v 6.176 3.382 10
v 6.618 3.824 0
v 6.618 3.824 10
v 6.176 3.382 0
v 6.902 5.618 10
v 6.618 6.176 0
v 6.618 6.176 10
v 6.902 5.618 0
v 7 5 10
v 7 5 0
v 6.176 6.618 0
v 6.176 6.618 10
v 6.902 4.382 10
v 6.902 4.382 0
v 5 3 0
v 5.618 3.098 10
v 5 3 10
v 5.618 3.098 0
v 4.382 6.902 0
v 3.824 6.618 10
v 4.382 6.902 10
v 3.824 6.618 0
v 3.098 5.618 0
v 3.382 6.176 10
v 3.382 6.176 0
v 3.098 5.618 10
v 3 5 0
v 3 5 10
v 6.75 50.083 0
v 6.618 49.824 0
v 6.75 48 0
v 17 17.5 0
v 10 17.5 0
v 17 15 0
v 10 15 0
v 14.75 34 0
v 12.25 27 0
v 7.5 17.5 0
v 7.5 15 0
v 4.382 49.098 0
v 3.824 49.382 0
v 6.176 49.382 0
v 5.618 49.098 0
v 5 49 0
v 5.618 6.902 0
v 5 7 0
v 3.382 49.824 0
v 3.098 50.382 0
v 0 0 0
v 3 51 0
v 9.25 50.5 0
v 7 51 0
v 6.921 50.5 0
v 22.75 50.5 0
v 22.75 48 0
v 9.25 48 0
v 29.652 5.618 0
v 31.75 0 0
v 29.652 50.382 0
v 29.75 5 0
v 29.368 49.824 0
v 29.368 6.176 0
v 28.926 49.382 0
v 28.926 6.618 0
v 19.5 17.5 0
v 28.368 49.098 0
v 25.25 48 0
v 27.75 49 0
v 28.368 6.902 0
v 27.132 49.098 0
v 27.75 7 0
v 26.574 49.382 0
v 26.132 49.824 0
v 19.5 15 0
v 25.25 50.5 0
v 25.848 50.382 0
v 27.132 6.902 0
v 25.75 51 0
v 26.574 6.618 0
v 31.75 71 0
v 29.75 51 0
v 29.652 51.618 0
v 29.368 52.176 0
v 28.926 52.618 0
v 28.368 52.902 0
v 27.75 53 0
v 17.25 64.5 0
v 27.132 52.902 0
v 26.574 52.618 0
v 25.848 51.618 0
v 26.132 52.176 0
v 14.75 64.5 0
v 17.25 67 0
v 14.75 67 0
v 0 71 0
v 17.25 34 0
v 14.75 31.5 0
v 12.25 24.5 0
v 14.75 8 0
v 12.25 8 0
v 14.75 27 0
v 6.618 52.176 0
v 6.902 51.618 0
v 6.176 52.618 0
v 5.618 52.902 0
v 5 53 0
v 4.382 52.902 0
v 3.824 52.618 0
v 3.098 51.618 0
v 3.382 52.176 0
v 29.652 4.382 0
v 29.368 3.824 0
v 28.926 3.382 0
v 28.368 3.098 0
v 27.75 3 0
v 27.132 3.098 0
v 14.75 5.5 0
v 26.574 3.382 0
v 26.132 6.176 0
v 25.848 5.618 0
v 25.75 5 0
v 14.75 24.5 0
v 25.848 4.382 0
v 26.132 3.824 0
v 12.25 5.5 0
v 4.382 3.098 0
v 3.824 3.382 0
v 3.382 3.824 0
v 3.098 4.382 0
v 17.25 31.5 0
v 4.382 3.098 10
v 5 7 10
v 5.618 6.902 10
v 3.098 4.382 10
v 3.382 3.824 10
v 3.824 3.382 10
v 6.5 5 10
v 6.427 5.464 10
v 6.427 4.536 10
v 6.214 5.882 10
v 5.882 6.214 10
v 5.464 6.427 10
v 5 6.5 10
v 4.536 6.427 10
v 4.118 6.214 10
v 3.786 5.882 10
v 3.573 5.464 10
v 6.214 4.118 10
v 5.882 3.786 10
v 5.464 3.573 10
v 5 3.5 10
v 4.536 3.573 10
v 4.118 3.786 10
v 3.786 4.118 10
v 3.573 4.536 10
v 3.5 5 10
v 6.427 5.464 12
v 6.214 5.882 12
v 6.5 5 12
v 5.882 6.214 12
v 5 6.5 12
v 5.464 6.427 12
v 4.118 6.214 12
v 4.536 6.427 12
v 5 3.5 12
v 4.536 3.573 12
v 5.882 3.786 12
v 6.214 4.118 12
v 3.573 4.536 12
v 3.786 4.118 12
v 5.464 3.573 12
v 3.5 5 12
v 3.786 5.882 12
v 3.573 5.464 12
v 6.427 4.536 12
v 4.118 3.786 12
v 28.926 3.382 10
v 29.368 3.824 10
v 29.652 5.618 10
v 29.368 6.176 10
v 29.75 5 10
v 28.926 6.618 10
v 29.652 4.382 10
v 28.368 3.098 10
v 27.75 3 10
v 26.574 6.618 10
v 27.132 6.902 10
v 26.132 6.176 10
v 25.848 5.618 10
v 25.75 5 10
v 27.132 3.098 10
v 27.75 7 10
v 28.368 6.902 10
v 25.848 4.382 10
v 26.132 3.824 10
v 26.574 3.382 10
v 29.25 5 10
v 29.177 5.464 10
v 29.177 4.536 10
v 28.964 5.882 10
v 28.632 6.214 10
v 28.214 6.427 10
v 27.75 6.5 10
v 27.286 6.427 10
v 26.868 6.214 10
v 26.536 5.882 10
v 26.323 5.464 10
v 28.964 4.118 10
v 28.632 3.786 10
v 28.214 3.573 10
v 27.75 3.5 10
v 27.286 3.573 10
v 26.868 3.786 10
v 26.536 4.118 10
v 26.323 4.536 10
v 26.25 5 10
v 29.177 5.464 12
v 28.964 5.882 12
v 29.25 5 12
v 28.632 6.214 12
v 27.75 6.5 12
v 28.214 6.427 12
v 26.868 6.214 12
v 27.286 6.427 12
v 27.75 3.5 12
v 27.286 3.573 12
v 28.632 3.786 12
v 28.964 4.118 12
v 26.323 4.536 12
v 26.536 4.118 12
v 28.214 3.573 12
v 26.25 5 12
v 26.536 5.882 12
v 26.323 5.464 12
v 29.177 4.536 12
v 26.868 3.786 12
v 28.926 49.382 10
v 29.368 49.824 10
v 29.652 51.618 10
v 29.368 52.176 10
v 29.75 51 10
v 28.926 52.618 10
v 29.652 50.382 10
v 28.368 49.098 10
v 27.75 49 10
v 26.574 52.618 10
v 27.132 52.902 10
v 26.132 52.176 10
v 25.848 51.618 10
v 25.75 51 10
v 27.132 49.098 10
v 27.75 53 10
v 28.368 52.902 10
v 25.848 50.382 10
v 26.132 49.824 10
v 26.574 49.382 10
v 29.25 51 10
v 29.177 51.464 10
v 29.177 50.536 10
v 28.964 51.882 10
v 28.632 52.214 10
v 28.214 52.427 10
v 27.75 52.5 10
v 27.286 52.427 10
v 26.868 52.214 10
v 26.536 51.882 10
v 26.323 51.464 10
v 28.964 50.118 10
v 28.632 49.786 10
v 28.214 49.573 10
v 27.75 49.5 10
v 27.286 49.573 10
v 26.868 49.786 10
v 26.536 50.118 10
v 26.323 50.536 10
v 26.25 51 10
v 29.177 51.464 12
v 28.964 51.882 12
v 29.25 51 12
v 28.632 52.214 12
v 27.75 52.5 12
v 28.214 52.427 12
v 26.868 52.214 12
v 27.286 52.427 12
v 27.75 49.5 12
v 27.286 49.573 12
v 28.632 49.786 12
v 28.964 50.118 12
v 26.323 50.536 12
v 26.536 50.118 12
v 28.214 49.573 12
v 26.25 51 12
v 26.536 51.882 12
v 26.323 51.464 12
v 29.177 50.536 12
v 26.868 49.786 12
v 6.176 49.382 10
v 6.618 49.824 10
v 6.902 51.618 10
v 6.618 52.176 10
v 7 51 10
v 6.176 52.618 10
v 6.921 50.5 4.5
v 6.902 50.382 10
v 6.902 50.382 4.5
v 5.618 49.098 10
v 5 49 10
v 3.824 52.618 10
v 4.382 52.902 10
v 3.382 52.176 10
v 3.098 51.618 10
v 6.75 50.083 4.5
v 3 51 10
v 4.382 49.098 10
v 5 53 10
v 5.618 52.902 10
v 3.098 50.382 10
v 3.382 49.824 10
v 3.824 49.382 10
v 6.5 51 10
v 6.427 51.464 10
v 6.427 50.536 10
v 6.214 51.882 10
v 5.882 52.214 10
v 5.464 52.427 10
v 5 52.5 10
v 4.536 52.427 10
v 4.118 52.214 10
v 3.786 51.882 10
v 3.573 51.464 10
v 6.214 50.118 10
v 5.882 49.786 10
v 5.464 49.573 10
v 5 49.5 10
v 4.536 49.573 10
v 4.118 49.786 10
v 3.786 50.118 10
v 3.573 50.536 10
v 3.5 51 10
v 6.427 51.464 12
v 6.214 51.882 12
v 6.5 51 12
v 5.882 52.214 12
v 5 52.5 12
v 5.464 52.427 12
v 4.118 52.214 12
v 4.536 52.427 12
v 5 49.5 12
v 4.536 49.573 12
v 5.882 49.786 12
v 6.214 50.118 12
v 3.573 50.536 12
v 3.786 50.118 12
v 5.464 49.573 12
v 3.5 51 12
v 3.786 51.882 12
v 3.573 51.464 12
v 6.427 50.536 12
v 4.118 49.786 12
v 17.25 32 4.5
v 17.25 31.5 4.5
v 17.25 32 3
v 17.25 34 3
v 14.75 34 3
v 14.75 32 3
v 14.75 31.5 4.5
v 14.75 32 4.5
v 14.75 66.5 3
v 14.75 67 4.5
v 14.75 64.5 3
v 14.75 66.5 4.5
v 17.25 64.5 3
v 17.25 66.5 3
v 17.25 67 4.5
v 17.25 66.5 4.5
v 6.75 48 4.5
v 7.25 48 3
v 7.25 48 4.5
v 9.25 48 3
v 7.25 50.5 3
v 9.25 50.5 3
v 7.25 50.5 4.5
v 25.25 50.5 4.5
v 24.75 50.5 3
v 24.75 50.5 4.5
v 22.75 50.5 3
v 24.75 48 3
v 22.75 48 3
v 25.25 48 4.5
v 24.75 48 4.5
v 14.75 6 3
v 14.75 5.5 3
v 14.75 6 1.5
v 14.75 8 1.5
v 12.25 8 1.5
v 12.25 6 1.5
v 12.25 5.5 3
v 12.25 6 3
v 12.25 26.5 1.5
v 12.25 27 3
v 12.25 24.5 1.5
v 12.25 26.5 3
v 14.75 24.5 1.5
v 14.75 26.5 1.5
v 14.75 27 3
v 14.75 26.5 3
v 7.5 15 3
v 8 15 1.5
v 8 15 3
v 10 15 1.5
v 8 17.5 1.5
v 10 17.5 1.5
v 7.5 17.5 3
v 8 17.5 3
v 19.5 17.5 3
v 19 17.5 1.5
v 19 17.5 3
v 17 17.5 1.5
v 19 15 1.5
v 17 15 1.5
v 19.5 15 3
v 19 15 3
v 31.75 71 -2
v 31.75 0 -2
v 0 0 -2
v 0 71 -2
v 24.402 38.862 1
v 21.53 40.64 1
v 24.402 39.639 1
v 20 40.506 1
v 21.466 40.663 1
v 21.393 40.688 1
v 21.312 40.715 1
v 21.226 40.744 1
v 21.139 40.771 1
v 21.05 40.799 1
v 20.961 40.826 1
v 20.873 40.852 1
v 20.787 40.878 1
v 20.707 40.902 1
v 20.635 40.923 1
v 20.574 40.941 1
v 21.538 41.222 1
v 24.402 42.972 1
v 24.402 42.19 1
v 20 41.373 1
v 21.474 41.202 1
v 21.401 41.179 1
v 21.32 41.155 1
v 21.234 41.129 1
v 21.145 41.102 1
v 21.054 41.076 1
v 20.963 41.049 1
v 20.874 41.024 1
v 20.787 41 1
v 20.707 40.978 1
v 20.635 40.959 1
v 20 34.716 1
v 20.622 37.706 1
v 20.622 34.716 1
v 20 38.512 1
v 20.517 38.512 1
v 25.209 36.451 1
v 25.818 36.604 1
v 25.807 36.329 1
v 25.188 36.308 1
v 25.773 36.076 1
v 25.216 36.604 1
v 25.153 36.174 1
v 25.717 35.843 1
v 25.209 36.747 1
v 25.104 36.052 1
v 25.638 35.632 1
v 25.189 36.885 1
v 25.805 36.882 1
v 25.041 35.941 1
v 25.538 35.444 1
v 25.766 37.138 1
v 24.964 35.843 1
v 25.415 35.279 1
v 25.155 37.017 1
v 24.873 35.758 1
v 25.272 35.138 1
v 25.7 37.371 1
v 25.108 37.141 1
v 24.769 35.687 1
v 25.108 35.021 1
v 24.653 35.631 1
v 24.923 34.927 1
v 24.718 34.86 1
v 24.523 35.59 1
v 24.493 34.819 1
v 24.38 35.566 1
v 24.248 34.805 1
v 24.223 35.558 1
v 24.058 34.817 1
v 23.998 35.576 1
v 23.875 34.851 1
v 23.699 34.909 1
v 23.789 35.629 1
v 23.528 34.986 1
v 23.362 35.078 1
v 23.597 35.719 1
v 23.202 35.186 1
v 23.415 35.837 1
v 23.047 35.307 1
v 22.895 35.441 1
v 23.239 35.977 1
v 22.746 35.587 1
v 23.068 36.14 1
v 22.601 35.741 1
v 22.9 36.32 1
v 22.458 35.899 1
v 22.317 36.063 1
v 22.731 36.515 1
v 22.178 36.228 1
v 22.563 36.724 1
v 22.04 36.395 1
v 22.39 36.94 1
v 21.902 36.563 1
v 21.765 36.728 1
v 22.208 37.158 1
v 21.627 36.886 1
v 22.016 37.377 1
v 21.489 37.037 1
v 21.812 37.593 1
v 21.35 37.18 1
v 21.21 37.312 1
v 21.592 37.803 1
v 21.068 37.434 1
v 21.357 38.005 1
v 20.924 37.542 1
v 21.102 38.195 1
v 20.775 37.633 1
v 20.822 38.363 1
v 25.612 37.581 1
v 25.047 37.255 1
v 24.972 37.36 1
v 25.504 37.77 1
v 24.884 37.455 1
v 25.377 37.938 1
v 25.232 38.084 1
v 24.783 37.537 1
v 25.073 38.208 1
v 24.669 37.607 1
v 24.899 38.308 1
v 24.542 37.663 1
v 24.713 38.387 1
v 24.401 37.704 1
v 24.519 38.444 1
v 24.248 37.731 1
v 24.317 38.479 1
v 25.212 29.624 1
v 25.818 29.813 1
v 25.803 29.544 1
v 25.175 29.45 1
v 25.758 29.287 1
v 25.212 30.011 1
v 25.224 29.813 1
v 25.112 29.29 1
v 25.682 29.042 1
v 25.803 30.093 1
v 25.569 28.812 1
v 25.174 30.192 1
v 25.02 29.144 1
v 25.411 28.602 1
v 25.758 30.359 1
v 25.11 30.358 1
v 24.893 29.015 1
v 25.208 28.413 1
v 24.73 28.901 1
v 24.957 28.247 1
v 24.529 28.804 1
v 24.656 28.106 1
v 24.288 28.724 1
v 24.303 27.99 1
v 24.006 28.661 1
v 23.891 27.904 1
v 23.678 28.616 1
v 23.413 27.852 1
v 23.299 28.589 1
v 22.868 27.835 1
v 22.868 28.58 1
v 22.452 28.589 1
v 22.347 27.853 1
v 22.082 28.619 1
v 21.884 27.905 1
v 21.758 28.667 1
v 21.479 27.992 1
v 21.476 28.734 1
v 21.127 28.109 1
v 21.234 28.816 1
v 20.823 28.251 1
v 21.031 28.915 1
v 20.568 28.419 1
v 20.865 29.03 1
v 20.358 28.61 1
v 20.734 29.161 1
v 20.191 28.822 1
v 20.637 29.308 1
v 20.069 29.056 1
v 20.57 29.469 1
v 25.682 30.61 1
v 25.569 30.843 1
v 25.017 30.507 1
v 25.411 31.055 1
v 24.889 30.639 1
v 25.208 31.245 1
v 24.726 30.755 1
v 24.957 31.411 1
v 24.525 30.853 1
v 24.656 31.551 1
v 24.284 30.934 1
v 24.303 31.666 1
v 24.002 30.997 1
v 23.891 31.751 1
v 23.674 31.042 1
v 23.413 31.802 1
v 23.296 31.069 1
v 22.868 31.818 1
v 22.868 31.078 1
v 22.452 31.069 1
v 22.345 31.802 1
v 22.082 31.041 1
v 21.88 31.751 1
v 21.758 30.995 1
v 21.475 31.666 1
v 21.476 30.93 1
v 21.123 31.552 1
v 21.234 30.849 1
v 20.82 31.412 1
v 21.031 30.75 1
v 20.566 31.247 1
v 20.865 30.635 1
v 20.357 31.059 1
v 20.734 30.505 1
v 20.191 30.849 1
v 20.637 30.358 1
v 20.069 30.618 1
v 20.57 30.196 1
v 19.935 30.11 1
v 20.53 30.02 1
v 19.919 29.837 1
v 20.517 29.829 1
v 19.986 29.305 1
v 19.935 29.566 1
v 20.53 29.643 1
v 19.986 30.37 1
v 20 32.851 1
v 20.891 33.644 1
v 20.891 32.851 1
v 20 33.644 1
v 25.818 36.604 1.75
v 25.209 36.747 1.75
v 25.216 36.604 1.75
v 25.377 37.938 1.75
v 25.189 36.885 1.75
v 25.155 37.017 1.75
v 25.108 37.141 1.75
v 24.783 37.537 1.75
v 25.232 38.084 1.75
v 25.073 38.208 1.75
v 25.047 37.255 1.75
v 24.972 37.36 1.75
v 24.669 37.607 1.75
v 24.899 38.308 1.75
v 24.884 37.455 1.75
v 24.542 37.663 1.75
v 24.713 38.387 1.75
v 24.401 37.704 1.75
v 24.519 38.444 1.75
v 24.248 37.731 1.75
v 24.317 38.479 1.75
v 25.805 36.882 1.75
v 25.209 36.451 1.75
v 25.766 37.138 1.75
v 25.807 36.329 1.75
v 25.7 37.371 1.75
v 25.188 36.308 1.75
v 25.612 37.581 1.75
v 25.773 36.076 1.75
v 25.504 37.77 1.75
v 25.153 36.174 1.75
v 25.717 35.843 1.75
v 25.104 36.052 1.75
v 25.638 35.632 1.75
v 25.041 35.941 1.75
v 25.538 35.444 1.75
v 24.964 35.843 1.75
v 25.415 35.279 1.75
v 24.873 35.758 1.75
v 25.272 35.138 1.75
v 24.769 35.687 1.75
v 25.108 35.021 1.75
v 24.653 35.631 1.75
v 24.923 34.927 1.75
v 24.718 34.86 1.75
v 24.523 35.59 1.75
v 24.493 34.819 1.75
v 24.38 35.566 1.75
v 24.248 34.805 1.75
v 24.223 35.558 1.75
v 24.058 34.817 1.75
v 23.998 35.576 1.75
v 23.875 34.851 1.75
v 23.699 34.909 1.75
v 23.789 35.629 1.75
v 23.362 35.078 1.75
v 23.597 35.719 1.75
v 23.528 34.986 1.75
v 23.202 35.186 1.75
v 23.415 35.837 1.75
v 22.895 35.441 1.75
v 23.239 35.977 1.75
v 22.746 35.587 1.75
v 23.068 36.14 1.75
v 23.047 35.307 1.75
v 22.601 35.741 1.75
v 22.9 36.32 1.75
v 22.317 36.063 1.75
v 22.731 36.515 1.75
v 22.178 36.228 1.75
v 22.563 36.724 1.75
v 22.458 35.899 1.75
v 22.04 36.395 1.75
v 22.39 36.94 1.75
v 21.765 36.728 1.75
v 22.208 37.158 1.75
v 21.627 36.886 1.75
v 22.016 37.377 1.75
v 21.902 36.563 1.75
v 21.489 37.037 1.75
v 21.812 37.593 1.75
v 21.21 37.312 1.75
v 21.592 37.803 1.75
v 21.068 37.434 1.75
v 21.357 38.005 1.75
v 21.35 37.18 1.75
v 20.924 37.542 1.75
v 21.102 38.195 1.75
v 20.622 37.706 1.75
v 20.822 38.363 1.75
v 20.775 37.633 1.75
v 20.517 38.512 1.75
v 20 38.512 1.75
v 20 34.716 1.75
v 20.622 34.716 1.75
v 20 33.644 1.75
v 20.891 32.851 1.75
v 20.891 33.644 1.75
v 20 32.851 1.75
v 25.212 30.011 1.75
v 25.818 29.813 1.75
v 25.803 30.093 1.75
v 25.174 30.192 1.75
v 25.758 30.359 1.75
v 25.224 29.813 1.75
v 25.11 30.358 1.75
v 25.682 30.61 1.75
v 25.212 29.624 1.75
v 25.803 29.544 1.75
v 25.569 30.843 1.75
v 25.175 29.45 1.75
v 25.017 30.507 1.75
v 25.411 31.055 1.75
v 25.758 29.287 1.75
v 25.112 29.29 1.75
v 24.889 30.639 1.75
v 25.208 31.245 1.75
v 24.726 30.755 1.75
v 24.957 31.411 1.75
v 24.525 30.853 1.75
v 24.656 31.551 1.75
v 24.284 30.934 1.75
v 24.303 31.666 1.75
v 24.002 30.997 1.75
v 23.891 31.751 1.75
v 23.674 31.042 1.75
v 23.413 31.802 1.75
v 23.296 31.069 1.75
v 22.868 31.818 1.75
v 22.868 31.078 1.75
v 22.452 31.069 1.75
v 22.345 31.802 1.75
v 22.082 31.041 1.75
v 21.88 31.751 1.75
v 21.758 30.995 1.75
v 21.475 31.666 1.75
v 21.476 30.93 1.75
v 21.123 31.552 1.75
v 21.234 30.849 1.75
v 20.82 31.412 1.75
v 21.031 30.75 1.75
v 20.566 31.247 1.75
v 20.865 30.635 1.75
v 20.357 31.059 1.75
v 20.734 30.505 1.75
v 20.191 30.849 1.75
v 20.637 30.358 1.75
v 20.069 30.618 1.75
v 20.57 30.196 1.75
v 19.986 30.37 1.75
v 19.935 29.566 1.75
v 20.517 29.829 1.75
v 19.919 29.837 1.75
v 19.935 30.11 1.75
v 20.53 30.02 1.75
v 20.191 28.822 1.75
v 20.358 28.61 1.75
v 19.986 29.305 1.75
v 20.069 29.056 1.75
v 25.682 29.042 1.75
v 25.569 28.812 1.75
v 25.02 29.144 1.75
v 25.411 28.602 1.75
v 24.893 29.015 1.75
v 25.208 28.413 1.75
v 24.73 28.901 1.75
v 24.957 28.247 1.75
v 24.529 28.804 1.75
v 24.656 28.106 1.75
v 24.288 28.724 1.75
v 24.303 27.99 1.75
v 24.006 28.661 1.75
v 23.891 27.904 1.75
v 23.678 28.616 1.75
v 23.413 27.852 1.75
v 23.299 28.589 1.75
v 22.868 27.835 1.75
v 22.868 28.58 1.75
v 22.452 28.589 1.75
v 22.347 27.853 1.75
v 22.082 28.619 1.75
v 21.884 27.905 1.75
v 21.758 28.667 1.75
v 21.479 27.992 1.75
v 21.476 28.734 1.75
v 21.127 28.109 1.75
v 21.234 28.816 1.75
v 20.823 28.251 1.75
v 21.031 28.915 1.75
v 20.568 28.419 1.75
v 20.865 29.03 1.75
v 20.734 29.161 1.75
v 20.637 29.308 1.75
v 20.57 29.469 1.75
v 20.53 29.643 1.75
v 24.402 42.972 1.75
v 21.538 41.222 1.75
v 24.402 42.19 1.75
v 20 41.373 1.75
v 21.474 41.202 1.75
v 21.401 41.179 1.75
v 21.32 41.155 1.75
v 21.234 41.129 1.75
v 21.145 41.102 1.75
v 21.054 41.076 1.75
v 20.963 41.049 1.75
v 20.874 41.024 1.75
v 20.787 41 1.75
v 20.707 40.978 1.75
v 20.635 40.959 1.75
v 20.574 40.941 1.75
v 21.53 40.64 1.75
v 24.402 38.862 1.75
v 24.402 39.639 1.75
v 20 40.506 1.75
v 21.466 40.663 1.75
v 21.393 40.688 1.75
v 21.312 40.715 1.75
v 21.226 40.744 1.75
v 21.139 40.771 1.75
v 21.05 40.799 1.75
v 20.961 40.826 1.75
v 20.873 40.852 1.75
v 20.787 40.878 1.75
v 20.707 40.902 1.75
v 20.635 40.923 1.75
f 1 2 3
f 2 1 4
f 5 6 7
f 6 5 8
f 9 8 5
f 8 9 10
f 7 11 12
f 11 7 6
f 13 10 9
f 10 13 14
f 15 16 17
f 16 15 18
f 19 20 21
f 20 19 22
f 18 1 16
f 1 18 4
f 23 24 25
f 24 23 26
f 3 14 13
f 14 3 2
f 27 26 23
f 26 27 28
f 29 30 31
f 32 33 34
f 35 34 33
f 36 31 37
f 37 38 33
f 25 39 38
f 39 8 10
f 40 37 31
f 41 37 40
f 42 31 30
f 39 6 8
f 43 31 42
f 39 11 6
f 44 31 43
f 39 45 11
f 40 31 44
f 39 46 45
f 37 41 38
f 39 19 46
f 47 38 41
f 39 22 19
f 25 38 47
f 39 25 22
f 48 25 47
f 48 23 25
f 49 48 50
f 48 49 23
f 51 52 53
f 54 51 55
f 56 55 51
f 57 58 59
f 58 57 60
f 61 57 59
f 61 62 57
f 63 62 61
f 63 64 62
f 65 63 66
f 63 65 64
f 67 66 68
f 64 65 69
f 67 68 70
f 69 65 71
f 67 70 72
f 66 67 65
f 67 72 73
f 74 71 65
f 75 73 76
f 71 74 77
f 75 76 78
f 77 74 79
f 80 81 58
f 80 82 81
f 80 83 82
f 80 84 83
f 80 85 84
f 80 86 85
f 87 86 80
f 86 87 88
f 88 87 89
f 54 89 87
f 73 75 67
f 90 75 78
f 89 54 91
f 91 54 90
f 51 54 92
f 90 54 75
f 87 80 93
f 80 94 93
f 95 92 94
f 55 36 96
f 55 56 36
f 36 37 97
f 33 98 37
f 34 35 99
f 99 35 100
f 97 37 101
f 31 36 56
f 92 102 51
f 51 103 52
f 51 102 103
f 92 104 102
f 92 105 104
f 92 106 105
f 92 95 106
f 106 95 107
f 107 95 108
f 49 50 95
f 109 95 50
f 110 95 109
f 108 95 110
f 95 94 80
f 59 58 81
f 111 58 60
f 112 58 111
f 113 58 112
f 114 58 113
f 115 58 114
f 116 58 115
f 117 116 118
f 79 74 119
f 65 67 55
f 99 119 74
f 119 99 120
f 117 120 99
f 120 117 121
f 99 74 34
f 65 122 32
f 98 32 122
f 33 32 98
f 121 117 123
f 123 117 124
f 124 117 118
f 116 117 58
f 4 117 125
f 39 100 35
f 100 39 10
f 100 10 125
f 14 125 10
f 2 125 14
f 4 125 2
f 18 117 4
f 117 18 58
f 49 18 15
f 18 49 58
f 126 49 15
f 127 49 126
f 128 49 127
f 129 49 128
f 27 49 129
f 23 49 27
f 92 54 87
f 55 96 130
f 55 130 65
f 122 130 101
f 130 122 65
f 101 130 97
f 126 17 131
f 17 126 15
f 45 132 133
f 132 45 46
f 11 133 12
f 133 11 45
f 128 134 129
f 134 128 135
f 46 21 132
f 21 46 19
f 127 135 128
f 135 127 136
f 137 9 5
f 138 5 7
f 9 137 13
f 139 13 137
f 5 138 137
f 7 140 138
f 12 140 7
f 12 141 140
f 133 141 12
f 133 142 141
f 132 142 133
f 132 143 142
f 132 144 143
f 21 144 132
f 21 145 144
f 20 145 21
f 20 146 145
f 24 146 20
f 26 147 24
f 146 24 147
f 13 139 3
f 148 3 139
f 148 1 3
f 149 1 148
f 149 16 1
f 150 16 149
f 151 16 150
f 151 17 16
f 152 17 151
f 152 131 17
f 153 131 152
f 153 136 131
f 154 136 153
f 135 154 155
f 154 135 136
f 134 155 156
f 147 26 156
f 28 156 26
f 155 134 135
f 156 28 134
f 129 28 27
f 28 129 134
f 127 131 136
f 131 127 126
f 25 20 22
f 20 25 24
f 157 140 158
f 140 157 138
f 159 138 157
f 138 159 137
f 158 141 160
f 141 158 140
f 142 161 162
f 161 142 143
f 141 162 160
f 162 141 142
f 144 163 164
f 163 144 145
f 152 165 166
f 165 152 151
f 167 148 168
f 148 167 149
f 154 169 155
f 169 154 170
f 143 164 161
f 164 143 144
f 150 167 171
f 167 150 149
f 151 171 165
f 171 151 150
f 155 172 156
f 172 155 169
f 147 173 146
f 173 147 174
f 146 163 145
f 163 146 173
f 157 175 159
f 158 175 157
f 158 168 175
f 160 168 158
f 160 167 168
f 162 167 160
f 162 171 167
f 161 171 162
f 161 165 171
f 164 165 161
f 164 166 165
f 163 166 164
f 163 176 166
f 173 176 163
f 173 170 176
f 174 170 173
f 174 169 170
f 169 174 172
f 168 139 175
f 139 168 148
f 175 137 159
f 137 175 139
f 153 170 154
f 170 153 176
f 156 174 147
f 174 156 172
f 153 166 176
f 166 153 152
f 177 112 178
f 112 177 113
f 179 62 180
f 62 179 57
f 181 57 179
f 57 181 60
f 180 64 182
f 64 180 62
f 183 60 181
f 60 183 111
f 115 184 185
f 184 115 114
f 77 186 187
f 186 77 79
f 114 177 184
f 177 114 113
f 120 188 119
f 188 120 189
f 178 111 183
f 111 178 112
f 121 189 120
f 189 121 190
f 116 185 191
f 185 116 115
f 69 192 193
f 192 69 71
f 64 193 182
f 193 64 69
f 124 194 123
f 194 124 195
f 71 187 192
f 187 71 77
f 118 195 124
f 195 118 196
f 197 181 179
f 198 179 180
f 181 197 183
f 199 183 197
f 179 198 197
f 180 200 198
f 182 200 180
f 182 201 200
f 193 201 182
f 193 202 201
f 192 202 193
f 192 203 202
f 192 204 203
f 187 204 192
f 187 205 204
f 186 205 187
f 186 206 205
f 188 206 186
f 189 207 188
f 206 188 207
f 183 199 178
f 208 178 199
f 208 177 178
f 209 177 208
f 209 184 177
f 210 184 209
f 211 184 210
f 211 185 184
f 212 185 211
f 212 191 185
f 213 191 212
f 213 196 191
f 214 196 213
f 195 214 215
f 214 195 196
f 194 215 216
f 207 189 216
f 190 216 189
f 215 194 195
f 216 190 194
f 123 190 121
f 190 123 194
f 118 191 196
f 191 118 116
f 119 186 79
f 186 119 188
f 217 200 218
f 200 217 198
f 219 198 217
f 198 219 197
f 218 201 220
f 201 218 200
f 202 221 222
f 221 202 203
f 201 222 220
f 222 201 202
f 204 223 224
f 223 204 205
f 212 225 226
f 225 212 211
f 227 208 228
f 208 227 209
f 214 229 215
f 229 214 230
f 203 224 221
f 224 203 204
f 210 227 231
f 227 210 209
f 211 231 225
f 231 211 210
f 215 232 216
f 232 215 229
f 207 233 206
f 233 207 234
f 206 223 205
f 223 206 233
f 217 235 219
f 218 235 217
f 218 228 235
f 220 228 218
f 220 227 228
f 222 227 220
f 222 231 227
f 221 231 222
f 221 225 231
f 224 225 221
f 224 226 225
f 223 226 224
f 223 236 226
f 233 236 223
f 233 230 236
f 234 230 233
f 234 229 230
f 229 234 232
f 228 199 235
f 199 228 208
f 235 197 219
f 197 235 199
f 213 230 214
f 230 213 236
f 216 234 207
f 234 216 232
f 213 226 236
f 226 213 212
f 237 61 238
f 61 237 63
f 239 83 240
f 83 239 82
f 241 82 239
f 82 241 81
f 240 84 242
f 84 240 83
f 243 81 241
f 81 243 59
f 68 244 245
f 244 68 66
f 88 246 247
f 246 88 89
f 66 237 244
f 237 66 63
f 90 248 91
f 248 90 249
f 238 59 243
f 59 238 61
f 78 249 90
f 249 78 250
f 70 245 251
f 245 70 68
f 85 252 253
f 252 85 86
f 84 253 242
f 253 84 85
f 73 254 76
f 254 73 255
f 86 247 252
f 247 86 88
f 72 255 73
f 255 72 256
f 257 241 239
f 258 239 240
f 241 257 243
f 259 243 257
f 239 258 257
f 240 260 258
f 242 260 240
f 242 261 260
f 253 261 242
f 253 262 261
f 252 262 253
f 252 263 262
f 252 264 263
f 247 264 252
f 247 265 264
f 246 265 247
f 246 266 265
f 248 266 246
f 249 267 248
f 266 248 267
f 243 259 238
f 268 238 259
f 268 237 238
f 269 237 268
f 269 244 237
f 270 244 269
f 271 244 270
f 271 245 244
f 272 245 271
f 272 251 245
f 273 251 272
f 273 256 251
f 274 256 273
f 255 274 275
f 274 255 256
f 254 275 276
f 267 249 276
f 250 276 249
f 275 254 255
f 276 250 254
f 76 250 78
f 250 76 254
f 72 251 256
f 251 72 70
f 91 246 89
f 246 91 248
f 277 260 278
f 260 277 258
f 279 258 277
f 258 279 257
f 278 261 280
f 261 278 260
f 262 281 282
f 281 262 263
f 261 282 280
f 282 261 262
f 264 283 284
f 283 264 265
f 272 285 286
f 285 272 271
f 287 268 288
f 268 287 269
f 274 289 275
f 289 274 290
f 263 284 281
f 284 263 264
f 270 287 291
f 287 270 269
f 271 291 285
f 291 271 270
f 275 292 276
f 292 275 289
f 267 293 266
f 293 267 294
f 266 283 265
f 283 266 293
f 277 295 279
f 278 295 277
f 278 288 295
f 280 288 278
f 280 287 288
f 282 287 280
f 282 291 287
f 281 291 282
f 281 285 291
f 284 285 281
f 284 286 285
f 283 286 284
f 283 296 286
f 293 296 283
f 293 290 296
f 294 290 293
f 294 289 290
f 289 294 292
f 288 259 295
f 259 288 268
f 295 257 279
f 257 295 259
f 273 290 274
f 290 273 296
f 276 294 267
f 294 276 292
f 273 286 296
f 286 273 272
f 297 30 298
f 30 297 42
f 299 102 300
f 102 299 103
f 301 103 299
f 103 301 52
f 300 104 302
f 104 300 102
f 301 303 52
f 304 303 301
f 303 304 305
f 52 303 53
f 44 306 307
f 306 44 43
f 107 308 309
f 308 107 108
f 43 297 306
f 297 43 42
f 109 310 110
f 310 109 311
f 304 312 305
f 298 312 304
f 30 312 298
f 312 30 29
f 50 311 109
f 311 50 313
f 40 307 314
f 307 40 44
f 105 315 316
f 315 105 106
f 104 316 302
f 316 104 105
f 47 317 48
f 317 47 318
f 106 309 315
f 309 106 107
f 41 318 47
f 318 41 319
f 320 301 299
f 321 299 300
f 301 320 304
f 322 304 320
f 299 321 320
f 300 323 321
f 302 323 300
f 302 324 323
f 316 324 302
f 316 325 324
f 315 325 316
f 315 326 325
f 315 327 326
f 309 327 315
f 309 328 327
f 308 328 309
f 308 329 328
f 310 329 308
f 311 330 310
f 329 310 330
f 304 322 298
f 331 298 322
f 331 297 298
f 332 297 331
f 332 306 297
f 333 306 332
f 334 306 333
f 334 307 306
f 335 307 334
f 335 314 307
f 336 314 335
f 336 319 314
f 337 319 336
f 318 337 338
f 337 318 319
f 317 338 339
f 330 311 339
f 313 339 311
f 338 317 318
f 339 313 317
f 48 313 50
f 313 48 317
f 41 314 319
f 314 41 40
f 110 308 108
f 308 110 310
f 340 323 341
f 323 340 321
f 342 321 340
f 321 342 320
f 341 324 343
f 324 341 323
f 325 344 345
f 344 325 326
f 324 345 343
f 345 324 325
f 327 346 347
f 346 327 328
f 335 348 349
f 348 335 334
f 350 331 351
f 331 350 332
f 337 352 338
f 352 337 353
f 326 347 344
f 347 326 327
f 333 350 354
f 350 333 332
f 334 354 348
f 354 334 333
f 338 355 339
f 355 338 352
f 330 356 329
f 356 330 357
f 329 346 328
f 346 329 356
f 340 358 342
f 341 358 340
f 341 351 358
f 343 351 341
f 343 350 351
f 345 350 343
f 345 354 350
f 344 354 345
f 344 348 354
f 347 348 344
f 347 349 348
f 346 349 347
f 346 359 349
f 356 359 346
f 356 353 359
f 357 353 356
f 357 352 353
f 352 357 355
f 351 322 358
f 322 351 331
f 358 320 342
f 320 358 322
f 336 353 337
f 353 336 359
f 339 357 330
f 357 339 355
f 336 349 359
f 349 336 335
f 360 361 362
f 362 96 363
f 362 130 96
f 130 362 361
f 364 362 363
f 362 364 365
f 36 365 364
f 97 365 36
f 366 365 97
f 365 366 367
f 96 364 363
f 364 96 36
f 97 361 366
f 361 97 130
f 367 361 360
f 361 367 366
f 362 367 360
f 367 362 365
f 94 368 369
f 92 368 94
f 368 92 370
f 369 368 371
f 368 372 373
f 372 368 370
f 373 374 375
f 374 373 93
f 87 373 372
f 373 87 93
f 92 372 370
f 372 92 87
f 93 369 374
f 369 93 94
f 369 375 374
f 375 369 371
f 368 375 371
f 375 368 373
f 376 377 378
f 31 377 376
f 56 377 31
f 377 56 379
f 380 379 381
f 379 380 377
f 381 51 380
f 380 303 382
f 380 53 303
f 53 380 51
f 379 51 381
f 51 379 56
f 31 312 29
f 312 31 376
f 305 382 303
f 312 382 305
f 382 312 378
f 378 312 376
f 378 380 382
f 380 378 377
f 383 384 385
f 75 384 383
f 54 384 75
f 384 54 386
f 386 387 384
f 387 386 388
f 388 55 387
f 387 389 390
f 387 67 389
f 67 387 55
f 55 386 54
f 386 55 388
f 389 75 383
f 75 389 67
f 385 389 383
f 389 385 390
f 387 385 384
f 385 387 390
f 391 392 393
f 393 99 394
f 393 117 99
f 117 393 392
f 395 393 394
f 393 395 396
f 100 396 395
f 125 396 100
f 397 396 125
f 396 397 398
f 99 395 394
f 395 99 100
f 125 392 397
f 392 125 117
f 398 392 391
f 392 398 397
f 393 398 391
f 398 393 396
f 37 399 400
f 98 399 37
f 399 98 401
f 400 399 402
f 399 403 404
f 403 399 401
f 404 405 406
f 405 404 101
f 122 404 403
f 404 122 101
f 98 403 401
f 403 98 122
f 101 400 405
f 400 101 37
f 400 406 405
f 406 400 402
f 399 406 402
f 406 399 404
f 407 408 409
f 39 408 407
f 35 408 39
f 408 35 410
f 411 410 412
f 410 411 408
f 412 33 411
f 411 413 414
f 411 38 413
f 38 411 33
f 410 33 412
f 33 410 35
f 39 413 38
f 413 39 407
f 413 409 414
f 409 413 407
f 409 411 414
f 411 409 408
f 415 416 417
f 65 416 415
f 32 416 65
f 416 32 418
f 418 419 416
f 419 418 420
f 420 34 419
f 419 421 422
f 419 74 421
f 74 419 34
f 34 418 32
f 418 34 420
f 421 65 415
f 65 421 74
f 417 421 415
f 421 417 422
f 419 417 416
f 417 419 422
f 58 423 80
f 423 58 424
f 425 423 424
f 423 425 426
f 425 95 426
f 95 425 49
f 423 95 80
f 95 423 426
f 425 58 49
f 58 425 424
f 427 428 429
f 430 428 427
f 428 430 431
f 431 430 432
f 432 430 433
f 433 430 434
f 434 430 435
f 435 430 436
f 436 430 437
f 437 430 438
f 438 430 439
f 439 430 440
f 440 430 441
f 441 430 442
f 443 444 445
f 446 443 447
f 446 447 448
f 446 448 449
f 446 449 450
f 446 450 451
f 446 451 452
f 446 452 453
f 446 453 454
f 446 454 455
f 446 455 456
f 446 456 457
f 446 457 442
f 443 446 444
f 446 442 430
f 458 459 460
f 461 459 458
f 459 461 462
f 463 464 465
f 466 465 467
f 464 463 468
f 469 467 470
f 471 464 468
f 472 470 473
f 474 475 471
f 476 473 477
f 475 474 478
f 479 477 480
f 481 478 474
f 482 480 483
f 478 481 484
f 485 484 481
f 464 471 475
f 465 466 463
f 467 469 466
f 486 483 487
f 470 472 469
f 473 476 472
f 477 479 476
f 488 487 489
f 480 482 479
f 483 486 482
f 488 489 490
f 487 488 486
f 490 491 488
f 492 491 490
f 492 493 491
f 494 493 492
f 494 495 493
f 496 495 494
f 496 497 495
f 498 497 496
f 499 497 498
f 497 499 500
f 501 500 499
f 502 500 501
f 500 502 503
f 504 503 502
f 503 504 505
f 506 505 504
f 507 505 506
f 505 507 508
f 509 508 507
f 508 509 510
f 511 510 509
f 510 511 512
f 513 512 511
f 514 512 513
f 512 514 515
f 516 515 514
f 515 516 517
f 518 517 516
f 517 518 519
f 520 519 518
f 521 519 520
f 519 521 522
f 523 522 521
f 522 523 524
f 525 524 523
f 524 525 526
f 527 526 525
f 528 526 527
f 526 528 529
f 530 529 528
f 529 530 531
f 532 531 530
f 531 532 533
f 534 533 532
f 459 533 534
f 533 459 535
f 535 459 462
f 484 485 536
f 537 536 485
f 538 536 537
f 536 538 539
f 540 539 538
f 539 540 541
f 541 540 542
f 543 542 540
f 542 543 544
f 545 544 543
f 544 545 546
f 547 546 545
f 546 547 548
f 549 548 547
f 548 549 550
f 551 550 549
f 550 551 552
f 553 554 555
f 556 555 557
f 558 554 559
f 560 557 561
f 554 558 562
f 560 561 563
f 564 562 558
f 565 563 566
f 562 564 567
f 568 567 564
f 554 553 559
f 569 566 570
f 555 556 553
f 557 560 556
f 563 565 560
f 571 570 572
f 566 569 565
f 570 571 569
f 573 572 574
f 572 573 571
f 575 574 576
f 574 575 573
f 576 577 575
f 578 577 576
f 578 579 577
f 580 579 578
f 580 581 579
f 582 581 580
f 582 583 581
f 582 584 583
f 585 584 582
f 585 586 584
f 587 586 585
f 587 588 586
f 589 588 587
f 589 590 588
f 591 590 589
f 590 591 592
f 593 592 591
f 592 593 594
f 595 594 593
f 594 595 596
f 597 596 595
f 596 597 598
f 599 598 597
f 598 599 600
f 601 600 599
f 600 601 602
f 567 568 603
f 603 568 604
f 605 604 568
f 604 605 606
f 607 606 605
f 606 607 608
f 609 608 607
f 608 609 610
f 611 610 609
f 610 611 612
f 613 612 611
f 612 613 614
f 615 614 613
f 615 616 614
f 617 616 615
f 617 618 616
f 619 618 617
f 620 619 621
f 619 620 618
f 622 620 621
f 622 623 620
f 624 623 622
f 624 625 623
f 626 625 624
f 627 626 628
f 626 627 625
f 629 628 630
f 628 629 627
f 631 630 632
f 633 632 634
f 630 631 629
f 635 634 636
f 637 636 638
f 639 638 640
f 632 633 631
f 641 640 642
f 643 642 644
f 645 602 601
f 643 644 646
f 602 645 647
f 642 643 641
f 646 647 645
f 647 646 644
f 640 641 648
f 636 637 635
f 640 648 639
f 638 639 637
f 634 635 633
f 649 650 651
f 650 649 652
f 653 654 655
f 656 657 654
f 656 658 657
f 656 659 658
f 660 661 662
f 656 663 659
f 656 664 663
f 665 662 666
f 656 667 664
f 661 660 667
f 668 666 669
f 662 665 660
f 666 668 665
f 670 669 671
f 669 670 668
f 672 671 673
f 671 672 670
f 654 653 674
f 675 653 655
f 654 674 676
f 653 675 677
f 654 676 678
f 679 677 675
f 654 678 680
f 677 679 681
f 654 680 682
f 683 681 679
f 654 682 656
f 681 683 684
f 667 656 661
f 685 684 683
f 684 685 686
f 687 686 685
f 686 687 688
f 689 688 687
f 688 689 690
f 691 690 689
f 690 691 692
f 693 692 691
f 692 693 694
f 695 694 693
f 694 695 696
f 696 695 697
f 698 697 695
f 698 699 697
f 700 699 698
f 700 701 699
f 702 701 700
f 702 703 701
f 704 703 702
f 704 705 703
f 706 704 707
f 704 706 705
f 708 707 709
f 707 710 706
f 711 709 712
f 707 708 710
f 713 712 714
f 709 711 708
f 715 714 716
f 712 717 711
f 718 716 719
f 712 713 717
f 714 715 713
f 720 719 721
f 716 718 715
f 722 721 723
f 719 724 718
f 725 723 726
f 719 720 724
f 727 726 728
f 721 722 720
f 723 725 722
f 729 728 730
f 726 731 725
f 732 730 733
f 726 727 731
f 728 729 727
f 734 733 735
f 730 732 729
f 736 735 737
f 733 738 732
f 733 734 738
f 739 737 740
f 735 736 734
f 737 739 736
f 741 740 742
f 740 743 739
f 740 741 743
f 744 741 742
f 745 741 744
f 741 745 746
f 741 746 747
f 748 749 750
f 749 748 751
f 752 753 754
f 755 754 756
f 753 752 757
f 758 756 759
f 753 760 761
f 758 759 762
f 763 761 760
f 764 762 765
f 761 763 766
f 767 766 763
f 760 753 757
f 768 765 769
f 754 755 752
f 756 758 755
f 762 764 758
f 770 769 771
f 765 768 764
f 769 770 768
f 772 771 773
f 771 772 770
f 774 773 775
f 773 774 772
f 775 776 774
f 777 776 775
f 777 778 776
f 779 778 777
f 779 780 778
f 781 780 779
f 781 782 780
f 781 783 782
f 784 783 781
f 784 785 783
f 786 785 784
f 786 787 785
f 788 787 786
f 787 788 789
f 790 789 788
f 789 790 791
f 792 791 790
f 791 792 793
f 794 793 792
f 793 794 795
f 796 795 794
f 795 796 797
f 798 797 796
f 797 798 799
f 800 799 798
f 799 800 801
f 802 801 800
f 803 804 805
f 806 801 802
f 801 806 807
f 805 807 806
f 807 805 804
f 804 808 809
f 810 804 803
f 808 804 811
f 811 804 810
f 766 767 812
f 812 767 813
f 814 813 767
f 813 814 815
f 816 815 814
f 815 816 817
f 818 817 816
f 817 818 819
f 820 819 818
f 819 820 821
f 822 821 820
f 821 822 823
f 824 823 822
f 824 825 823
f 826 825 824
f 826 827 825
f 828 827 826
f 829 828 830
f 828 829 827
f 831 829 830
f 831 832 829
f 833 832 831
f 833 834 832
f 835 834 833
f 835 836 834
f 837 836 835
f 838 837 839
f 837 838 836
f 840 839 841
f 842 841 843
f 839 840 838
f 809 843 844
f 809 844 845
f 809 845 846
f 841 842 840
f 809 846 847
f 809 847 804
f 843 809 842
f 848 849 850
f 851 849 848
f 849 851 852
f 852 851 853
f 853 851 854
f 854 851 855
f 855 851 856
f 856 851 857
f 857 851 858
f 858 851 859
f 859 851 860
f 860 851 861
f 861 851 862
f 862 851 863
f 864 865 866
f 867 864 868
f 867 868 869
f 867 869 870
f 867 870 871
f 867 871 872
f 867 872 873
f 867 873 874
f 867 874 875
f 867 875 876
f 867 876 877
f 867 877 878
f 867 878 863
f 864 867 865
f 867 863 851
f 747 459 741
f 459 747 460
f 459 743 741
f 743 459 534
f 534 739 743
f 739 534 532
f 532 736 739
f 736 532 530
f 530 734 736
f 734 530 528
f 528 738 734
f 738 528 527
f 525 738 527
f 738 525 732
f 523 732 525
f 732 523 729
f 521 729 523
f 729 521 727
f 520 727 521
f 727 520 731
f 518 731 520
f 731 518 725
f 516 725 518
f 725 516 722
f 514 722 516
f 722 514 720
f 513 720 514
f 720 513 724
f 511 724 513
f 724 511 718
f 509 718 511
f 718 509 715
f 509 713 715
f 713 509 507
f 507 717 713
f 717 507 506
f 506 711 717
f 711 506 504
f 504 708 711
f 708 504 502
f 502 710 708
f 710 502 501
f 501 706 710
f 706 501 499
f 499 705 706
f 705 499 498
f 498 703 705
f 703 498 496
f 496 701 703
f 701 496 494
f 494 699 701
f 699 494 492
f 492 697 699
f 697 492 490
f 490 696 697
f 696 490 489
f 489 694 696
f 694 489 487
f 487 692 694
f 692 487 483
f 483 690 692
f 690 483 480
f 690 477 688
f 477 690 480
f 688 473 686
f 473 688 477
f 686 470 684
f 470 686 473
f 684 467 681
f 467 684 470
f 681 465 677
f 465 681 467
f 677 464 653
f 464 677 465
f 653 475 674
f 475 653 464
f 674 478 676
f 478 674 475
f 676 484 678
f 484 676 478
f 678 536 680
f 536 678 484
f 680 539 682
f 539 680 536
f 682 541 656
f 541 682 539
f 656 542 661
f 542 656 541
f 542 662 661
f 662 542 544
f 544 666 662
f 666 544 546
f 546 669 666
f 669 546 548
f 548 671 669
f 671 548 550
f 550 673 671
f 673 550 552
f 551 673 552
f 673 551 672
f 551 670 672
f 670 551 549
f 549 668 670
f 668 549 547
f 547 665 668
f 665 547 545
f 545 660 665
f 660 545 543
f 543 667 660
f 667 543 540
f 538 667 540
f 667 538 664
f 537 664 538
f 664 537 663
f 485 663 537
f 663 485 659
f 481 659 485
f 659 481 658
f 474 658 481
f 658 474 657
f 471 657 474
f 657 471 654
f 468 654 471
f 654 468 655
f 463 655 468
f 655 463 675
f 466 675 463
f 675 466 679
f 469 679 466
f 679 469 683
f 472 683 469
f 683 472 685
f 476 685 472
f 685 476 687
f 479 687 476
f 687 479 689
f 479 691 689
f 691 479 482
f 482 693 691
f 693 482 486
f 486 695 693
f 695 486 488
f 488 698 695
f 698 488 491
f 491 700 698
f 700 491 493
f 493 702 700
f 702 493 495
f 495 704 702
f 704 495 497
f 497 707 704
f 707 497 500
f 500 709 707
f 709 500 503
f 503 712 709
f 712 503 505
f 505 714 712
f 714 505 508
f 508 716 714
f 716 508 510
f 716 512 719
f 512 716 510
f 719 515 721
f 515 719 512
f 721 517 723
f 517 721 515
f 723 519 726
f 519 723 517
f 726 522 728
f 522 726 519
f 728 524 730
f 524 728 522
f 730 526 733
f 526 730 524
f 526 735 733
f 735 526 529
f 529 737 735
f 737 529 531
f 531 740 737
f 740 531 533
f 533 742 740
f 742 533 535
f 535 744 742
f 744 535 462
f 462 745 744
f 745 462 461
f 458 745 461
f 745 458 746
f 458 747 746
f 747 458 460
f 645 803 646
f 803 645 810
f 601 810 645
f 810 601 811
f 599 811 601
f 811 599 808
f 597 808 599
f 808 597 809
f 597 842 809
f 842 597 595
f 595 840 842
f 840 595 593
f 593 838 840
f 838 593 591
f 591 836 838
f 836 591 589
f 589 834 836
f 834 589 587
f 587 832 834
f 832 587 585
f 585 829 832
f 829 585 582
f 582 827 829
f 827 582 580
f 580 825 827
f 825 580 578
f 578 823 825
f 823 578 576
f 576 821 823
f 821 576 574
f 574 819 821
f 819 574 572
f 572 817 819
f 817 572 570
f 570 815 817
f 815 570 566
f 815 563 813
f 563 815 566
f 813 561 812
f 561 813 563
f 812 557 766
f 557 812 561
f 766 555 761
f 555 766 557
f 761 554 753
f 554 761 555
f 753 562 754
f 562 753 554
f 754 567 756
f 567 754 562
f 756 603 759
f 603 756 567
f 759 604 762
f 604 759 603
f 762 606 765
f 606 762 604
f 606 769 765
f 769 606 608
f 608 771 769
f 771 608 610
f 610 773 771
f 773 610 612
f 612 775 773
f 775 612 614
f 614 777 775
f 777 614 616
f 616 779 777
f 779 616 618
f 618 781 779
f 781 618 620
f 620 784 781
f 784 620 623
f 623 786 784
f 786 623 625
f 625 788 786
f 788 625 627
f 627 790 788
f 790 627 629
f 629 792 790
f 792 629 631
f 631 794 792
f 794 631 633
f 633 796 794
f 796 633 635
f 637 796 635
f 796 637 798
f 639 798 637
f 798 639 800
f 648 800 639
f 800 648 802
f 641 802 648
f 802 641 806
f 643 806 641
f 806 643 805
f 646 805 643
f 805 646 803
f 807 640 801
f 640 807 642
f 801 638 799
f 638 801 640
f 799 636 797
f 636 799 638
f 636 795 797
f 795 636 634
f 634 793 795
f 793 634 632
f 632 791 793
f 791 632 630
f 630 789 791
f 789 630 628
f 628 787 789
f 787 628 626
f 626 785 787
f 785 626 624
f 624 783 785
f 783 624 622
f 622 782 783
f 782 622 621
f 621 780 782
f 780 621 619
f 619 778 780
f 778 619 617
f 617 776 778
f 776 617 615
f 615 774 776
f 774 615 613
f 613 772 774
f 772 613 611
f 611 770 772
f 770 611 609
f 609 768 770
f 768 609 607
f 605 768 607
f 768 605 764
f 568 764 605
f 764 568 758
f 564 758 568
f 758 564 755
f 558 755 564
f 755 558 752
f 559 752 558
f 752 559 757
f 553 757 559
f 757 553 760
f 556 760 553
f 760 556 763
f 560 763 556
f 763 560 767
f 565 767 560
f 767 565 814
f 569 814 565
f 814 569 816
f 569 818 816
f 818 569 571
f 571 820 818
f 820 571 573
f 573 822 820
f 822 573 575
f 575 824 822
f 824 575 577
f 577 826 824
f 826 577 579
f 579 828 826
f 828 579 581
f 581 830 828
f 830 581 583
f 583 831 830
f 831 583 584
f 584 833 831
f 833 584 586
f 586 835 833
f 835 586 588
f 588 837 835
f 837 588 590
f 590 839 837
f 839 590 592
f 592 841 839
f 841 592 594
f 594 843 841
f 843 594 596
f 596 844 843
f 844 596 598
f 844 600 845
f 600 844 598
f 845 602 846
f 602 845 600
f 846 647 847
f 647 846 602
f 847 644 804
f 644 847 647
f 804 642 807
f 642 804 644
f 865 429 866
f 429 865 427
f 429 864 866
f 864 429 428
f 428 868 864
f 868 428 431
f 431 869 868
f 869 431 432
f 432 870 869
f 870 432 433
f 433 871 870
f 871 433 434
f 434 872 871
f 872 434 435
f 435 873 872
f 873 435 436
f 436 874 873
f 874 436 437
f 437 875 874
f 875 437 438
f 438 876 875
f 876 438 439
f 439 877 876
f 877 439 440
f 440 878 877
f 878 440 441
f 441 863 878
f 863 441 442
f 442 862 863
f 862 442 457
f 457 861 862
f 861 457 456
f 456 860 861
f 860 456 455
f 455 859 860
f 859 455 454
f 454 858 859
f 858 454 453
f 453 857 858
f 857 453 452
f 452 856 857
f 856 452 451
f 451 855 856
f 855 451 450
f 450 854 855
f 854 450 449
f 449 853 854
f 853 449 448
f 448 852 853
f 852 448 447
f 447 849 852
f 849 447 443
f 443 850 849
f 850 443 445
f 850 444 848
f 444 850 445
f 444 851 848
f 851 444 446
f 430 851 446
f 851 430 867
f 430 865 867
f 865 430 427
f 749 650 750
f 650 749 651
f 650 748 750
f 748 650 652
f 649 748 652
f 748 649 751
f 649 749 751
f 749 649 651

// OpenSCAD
// file: pcb_standoff.scad
// A standoff with a setback for holding the edge of a pcb
module pcb_standoff(h=10, w=5, l=5, lip=1.5, setback=2) {
    translate([-l/2, -w+setback, 0]) {
        cube([l, w, h]);
        cube([l, w-setback, h+lip]);
    }
}

// A peg for holding the screw-hole of a pcb
module pcb_peg(h=10, outer_r=2.5, inner_r=1, lip=1.5) {
    cylinder(h=h, r=outer_r, $fn=20);
    cylinder(h=h+lip, r=inner_r, $fn=20);
}

// Support a PCB with four standoffs
module pcb_holder(pcb_w, pcb_l, standoff_w=2.5, standoff_l=2.5, h=5, lip=1.5, setback=2) {
    // width is x, length is y
    translate([pcb_w / 2, 0, 0])
        pcb_standoff(h=h, w=standoff_w, l=standoff_l, lip=lip, setback=setback);
    translate([pcb_w / 2, pcb_l, 0])
        rotate([0,0,180])
            pcb_standoff(h=h, w=standoff_w, l=standoff_l, lip=lip, setback=setback);
    translate([0, pcb_l / 2, 0])
        rotate([0,0,270])
            pcb_standoff(h=h, w=standoff_w, l=standoff_l, lip=lip, setback=setback);
    translate([pcb_w, pcb_l / 2, 0])
        rotate([0,0,90])
            pcb_standoff(h=h, w=standoff_w, l=standoff_l, lip=lip, setback=setback);
}

*pcb_standoff();
*pcb_peg();
*pcb_holder(30, 15);
// main file
include <pcb_standoff.scad>

x=0; y=1; z=2;

placeholders = false;

label_text = "v2.0";
label_size = 6;

sw = 2.5; // standoff width
hsw = sw / 2;

esp_h = 10;
esp_l=52;
esp_w=28.75;
esp_clearance_r = 2;
esp_screw_r = 1.5;
esp_peg_locs = 
[
    [2, 2],
    [esp_w - 4, 2],
    [esp_w - 4, esp_l - 4],
    [2, esp_l - 4]
];

mosfet_h = 3;
mosfet_l = 34.5;
mosfet_w = 17.5;

buck_h=1.5;
buck_l=20.5;
buck_w=11;

// pcb's
translate([3, 3, 0])
    esp32();
translate([7.25, 32, 0])
    mosfet();
translate([8, 6, 0])
    buck();
    
// base
basedim=[esp_w + 3, 71, 2];
translate([0,0,-2])
    cube(basedim);
    
// lid
translate([40, 0, 0])
    *lid();

// label
color("red") label();

module label() {
    translate([20,43,1])
    rotate([0,0,-90])
        linear_extrude(0.75)
            text(label_text, size=label_size);
}

module lid() {
    cube(basedim);
}

module esp32() {
    for (i = [0:len(esp_peg_locs)-1]) {
        translate(esp_peg_locs[i]) {
            pcb_peg(h=esp_h, outer_r=esp_clearance_r, inner_r=esp_screw_r, lip=2);
        }
    }
    if (placeholders)
        translate([0,0,esp_h])
            color("green") cube([esp_w, esp_l, 1.5]);
}

module mosfet() {
    pcb_holder(mosfet_w, mosfet_l, h=mosfet_h);
    if (placeholders) {
        translate([0,0,mosfet_h])
            color("green") cube([mosfet_w, mosfet_l, 1.5]);
        translate([0,mosfet_l-10,mosfet_h+1.5])
            color("blue") cube([mosfet_w, 10, 10]);
    }
}

module buck() {
    pcb_holder(buck_w, buck_l, h=buck_h);
    if (placeholders)
        translate([0,0,buck_h])
            color("green") cube([buck_w, buck_l, 1.5]);
}
